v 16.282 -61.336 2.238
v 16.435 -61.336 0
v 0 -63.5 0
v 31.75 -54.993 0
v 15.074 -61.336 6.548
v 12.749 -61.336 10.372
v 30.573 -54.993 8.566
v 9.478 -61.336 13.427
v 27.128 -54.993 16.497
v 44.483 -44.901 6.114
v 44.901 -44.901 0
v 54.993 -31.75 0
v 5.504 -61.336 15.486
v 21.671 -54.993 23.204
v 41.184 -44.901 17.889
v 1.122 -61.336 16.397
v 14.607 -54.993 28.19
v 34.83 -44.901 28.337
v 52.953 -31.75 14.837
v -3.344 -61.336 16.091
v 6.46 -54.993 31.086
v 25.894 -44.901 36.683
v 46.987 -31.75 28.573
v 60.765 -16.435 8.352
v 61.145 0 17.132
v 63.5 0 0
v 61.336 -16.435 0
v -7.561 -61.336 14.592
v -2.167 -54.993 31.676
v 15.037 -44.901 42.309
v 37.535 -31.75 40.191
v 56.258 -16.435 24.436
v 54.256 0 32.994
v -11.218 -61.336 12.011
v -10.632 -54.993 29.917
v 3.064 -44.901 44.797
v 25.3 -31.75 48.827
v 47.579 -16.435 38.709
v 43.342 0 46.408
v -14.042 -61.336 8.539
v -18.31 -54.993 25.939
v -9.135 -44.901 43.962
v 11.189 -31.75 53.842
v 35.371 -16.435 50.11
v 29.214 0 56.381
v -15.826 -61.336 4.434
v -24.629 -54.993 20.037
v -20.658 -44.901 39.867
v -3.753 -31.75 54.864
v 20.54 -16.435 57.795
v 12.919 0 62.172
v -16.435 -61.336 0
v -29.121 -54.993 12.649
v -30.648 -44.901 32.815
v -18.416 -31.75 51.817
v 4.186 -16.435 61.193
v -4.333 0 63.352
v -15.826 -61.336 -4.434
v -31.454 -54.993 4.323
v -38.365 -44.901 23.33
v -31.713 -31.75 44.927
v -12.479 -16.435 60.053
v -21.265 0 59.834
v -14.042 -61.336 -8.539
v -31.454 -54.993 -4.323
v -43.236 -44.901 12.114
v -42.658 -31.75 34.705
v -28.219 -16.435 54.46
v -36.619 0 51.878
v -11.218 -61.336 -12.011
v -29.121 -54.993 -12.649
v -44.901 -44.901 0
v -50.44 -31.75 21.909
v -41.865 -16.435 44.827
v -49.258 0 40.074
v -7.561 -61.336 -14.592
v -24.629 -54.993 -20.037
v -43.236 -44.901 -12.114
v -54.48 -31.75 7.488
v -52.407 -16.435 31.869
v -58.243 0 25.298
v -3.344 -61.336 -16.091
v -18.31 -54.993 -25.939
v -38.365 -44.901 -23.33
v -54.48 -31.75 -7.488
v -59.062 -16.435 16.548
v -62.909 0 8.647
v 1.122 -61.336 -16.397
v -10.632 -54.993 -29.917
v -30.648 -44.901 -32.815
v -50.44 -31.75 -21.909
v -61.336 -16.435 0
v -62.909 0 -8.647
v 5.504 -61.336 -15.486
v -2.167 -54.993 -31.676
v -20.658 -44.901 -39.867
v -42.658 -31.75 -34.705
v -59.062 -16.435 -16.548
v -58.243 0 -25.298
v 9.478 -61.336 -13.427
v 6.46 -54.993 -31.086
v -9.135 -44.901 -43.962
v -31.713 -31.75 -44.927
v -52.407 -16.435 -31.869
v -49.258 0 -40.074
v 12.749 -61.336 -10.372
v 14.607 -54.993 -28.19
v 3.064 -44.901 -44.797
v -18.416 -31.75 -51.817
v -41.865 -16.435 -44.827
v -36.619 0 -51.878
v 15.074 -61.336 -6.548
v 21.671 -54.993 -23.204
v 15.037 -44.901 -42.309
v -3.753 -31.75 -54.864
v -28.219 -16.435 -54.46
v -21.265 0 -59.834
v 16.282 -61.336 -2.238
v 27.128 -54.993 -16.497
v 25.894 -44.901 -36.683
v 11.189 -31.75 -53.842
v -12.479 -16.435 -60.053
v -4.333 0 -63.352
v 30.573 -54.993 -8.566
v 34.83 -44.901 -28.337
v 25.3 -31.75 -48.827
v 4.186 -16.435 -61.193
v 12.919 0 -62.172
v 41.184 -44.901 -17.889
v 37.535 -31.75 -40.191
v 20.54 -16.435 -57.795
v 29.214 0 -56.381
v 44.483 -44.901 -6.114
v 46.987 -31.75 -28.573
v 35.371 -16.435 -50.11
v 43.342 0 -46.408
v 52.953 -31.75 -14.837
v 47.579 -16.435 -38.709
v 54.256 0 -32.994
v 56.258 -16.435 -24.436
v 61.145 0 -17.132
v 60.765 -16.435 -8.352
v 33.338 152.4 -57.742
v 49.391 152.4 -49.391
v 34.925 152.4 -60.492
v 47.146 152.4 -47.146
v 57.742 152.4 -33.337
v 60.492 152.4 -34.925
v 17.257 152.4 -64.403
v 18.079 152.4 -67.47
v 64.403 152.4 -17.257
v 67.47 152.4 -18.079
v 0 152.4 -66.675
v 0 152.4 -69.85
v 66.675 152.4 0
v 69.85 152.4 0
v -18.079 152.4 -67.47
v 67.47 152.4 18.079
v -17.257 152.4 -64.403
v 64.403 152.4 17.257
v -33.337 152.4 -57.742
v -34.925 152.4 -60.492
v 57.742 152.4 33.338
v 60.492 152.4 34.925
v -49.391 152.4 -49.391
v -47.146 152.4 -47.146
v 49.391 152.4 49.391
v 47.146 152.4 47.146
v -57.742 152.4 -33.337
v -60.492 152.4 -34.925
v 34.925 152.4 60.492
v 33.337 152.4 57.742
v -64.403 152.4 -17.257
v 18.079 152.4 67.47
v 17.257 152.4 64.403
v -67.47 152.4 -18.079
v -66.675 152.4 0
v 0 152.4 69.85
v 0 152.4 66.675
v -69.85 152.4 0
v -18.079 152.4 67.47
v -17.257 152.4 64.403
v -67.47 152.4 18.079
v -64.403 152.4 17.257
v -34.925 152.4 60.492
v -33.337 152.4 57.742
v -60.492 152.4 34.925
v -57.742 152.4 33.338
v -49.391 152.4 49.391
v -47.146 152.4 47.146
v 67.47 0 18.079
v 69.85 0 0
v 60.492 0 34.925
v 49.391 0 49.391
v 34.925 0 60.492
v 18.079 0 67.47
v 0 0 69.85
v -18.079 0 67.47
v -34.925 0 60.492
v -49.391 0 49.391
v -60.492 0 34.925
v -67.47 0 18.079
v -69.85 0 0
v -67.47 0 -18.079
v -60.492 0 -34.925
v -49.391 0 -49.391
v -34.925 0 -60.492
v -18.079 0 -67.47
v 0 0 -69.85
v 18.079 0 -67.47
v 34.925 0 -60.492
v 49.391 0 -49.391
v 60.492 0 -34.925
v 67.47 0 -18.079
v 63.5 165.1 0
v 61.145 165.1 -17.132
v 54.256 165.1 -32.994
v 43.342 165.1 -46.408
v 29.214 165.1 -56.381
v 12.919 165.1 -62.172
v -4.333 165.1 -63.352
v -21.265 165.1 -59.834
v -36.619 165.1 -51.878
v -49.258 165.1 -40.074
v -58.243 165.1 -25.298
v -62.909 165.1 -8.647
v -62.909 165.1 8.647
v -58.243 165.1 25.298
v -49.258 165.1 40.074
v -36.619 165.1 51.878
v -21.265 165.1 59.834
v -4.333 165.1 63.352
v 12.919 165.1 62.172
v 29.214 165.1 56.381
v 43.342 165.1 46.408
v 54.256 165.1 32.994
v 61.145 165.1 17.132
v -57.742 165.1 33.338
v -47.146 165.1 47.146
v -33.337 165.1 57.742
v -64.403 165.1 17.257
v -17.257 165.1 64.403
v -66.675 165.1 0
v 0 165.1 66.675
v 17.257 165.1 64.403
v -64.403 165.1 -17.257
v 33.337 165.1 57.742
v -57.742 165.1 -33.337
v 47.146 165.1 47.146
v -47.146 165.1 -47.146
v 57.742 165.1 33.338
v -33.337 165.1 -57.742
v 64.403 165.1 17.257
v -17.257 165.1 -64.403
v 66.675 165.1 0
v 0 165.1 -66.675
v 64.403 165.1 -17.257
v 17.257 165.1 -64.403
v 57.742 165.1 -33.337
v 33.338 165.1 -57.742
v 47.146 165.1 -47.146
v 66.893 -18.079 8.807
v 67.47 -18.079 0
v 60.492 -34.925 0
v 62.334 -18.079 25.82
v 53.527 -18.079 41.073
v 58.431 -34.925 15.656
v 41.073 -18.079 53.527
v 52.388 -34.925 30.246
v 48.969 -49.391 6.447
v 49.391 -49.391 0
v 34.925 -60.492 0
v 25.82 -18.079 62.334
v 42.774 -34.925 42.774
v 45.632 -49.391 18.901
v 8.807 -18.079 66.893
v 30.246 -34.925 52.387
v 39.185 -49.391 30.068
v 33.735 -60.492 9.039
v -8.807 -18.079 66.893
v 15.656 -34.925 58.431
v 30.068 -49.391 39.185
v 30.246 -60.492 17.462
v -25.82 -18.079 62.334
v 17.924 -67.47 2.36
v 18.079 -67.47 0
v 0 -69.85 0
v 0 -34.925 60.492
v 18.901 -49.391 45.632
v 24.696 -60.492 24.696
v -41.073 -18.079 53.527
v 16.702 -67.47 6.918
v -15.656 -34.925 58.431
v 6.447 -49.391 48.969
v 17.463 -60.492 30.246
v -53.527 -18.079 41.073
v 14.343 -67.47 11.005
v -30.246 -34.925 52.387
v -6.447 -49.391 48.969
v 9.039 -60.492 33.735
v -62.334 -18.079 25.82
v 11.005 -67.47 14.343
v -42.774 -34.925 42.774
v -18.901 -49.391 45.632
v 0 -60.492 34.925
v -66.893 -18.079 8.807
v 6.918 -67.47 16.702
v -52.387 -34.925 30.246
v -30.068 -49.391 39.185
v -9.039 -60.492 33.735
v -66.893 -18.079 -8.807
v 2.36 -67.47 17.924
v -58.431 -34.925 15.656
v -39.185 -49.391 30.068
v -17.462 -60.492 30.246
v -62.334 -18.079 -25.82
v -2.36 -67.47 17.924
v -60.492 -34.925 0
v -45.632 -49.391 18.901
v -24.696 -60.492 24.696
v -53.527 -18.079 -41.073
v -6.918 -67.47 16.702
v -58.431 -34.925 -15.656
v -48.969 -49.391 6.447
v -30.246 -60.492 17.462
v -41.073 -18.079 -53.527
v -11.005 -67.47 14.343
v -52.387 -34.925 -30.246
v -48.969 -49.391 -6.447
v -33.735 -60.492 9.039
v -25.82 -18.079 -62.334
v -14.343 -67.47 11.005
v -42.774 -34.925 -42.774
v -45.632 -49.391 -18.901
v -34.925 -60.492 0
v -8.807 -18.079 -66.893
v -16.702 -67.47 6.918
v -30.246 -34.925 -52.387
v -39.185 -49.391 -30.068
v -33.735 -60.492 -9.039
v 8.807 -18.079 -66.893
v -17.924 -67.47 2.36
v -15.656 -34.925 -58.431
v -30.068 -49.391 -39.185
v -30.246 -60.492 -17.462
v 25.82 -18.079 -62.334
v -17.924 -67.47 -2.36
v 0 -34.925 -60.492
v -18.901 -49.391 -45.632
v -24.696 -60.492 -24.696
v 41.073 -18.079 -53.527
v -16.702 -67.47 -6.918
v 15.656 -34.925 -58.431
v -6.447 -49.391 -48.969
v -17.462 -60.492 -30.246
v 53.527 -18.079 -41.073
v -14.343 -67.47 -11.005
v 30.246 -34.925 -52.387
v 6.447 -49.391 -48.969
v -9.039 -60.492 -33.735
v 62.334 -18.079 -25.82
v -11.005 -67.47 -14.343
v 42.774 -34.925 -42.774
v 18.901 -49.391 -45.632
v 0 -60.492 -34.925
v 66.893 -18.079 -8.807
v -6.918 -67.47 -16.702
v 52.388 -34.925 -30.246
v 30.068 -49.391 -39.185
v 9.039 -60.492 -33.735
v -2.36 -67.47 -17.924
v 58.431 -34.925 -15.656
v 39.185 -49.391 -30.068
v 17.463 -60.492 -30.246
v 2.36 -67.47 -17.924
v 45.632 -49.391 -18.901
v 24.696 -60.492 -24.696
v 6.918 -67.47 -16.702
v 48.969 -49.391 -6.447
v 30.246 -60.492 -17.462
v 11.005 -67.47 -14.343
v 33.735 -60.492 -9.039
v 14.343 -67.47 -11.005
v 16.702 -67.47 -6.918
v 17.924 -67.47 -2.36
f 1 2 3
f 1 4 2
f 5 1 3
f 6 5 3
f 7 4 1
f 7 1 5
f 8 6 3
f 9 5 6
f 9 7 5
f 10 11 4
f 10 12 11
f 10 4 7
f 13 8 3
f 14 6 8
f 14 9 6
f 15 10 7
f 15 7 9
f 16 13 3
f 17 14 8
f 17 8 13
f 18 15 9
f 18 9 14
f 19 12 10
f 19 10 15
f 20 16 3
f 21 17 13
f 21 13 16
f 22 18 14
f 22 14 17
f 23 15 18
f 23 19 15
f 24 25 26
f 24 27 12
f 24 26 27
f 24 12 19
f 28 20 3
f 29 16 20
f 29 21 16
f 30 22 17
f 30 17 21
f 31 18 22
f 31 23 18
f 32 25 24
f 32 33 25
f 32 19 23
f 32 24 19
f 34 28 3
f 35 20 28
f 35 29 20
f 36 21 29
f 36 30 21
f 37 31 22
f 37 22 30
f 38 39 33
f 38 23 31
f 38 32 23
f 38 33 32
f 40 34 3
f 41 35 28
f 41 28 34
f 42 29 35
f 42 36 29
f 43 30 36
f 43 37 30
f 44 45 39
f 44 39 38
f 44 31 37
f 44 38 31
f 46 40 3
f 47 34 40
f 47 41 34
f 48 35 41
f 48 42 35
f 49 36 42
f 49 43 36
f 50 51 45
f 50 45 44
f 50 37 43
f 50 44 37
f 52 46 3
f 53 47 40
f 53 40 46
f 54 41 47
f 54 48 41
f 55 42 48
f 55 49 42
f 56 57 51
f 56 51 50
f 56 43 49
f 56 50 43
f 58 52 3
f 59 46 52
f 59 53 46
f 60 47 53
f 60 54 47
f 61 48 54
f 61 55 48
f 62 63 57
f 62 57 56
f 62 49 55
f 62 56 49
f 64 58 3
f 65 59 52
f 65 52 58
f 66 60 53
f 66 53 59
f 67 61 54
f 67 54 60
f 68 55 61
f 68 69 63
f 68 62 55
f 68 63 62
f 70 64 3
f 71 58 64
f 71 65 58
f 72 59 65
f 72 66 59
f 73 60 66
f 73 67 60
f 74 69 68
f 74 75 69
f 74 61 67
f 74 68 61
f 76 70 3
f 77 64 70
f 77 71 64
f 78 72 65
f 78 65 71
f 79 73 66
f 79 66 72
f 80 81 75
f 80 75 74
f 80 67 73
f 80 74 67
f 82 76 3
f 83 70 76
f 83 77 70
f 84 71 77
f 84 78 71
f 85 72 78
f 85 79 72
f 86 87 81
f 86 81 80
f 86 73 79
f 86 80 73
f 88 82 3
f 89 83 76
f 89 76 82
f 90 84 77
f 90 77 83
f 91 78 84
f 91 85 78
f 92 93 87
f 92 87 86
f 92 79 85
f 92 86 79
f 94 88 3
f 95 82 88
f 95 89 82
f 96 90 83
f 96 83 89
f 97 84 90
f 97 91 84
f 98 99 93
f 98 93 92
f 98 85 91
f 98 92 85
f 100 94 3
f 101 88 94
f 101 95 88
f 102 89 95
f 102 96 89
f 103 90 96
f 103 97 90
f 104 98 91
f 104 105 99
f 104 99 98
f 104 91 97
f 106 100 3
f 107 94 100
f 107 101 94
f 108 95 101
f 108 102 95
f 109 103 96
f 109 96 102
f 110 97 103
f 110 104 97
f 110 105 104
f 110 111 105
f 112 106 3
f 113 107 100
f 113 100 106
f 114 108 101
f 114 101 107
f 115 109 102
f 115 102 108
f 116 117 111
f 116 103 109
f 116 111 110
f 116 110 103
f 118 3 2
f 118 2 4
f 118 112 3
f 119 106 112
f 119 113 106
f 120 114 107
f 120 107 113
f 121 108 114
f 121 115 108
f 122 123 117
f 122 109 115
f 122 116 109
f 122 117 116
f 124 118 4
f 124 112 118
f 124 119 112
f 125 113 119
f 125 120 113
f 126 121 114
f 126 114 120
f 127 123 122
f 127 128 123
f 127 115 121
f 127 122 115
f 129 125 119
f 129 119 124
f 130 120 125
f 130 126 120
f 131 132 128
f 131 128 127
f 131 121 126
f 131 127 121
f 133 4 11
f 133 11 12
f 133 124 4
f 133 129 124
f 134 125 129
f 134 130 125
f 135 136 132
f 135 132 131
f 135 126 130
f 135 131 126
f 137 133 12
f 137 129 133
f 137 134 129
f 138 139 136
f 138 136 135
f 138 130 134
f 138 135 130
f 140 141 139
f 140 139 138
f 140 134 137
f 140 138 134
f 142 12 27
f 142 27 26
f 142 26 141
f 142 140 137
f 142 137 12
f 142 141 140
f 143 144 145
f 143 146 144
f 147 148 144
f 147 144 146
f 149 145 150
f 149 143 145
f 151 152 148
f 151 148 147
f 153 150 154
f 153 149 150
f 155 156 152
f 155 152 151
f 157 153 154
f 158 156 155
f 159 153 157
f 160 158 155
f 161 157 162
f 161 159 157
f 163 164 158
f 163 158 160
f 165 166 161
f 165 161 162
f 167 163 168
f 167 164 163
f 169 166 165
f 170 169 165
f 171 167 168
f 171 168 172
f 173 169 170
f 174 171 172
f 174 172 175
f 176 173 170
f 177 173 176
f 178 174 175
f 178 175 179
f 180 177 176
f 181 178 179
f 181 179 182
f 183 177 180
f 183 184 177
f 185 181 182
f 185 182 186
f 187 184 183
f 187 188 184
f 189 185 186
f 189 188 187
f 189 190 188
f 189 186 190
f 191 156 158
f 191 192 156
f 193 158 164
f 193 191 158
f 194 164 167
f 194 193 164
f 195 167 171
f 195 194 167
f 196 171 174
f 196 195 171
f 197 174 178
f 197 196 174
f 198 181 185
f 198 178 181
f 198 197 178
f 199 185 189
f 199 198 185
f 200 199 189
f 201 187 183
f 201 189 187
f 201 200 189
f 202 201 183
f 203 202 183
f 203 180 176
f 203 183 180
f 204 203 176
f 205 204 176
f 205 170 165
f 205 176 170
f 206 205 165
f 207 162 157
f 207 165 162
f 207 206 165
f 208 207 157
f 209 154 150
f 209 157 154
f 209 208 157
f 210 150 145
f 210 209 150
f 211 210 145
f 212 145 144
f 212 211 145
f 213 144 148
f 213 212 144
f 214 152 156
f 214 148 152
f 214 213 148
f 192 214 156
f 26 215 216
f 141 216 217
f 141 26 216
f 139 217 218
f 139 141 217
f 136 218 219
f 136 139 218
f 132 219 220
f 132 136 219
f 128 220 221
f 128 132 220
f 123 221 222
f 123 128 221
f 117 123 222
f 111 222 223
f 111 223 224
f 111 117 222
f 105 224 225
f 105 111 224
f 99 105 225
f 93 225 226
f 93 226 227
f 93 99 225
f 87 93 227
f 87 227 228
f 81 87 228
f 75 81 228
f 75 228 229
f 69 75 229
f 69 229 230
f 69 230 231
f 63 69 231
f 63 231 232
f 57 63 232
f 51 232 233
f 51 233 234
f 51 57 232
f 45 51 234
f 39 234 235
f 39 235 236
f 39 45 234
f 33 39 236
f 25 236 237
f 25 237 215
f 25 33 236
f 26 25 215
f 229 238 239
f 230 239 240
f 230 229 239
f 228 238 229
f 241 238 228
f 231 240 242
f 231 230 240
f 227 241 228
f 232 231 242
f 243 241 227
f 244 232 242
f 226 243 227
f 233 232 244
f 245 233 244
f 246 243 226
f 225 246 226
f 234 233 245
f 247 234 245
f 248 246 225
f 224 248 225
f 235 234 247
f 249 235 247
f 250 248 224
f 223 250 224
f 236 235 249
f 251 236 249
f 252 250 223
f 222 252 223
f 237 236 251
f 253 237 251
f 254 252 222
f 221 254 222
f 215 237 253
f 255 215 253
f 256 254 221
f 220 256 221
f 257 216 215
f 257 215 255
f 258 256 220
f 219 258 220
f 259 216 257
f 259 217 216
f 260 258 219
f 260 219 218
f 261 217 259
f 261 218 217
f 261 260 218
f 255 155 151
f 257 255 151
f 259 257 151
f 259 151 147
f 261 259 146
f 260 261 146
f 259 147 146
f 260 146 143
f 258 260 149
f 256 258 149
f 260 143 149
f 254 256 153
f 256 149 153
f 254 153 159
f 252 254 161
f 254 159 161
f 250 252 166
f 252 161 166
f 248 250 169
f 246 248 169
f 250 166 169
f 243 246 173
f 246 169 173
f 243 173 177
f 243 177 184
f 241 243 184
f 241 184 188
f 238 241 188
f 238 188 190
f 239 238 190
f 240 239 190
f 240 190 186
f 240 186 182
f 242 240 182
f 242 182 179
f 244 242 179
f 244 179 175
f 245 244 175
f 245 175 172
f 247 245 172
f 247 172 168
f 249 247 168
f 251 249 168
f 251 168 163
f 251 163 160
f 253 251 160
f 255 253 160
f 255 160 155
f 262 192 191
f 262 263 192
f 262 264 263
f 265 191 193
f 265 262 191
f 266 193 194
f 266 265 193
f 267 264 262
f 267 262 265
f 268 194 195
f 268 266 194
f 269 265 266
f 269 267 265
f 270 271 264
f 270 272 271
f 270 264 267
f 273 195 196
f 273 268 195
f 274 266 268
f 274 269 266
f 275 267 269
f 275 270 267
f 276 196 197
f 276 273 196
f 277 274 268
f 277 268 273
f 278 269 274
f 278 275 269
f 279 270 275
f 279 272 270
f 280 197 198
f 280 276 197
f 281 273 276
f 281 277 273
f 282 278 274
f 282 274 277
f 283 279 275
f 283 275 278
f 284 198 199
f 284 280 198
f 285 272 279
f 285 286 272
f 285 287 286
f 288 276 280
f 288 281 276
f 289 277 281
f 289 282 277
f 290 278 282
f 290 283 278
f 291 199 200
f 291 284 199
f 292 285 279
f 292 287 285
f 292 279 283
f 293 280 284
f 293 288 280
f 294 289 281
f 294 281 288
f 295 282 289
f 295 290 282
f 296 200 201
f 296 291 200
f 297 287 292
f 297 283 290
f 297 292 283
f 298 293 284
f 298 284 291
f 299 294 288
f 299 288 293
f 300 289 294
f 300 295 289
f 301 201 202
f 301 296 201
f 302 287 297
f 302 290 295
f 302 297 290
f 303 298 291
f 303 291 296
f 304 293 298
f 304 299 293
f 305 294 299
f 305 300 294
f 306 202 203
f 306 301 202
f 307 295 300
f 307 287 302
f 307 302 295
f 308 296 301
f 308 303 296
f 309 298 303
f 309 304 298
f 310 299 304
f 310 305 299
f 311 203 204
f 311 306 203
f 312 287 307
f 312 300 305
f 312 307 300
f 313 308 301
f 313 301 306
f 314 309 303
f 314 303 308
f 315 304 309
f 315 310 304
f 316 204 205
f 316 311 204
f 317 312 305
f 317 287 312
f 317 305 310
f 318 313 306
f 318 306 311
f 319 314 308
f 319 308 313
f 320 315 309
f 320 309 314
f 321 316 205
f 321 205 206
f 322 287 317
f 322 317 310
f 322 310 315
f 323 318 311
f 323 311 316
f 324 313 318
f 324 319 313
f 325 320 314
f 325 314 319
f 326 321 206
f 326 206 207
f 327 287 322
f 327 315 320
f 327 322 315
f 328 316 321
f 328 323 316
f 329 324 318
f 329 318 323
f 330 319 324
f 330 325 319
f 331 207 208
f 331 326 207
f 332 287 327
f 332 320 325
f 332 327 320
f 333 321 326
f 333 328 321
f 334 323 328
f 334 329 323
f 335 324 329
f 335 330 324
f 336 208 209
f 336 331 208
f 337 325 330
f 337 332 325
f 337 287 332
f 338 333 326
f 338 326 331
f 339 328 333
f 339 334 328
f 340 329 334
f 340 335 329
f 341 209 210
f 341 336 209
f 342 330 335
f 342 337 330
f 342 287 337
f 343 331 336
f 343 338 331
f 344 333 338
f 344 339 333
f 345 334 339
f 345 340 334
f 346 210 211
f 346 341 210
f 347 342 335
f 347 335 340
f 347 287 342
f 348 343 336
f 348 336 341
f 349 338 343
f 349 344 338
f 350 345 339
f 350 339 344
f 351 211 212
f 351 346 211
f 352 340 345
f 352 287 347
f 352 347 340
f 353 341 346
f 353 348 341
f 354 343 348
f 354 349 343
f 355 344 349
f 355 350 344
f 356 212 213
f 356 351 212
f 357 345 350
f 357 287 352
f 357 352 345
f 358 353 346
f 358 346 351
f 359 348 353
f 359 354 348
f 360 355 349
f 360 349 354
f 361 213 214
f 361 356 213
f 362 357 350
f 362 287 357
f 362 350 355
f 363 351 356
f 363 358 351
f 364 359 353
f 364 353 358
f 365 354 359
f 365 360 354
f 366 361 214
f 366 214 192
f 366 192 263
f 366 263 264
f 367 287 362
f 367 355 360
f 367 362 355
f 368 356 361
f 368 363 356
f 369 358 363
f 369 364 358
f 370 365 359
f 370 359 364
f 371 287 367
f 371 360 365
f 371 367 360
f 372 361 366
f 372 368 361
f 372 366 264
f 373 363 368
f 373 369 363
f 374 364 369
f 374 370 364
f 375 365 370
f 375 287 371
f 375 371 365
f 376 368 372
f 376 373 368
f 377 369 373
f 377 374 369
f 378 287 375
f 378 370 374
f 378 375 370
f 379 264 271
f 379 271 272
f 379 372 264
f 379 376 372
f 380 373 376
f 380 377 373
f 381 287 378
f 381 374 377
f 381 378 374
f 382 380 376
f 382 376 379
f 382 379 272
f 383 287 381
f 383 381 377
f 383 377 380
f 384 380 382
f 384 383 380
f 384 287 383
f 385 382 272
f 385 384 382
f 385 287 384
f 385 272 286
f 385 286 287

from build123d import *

# Parameters (mm, degrees)
SKETCH3_R           = 69.85
CUT_EXTRUDE1_DEPTH  = 12.7
SKETCH4_R           = 66.675
SKETCH4_R_2         = 63.5
BOSS_EXTRUDE2_DEPTH = 12.7
SKETCH5_R           = 68.2625
SKETCH5_R_2         = 66.675
BOSS_EXTRUDE3_DEPTH = 9.525
SKETCH7_R           = 68.2625
SKETCH7_R_2         = 66.675
CUT_EXTRUDE2_DEPTH  = 1.5875
SKETCH12_R          = 68.2625
SKETCH12_R_2        = 66.675
CUT_EXTRUDE3_DEPTH  = 7.9375


with BuildPart() as part:
    # Sketch1 → Revolve1 (revolve)
    with BuildSketch(Plane.XY):
        with BuildLine():
            Line((63.5, 0), (63.5, 152.4))
            Line((63.5, 152.4), (66.675, 152.4))
            Line((66.675, 152.4), (66.675, 165.1))
            Line((66.675, 165.1), (69.85, 165.1))
            Line((69.85, 165.1), (69.85, 152.4))
            Line((69.85, 152.4), (69.85, 0))
            ThreePointArc((69.85, 0), (49.391408666, -49.391408666), (0, -69.85))
            Line((0, -69.85), (0, -63.5))
            ThreePointArc((0, -63.5), (44.901280605, -44.901280605), (63.5, 0))
        make_face()
    revolve(axis=Axis((0, -63.5, 0), (0, -1, 0)))

    # Sketch3 → Cut-Extrude1 (cut)
    with BuildSketch(Plane(origin=(0, 165.1, 0), x_dir=(1, 0, 0), z_dir=(0, 1, 0))):
        Circle(SKETCH3_R)
    extrude(amount=-CUT_EXTRUDE1_DEPTH, mode=Mode.SUBTRACT)

    # Sketch4 → Boss-Extrude2 (add)
    with BuildSketch(Plane(origin=(0, 152.4, 0), x_dir=(1, 0, 0), z_dir=(0, 1, 0))):
        Circle(SKETCH4_R)
        Circle(SKETCH4_R_2, mode=Mode.SUBTRACT)
    extrude(amount=BOSS_EXTRUDE2_DEPTH)

    # Sketch5 → Boss-Extrude3 (add)
    with BuildSketch(Plane(origin=(0, 165.1, 0), x_dir=(1, 0, 0), z_dir=(0, 1, 0))):
        Circle(SKETCH5_R)
        Circle(SKETCH5_R_2, mode=Mode.SUBTRACT)
    extrude(amount=-BOSS_EXTRUDE3_DEPTH)

    # Sketch7 → Cut-Extrude2 (cut)
    with BuildSketch(Plane(origin=(0, 165.1, 0), x_dir=(1, 0, 0), z_dir=(0, 1, 0))):
        Circle(SKETCH7_R)
        Circle(SKETCH7_R_2, mode=Mode.SUBTRACT)
    extrude(amount=-CUT_EXTRUDE2_DEPTH, mode=Mode.SUBTRACT)

    # Sketch12 → Cut-Extrude3 (cut)
    with BuildSketch(Plane(origin=(0, 163.5125, 0), x_dir=(1, 0, 0), z_dir=(0, 1, 0))):
        Circle(SKETCH12_R)
        Circle(SKETCH12_R_2, mode=Mode.SUBTRACT)
    extrude(amount=-CUT_EXTRUDE3_DEPTH, mode=Mode.SUBTRACT)


solid = part.part
